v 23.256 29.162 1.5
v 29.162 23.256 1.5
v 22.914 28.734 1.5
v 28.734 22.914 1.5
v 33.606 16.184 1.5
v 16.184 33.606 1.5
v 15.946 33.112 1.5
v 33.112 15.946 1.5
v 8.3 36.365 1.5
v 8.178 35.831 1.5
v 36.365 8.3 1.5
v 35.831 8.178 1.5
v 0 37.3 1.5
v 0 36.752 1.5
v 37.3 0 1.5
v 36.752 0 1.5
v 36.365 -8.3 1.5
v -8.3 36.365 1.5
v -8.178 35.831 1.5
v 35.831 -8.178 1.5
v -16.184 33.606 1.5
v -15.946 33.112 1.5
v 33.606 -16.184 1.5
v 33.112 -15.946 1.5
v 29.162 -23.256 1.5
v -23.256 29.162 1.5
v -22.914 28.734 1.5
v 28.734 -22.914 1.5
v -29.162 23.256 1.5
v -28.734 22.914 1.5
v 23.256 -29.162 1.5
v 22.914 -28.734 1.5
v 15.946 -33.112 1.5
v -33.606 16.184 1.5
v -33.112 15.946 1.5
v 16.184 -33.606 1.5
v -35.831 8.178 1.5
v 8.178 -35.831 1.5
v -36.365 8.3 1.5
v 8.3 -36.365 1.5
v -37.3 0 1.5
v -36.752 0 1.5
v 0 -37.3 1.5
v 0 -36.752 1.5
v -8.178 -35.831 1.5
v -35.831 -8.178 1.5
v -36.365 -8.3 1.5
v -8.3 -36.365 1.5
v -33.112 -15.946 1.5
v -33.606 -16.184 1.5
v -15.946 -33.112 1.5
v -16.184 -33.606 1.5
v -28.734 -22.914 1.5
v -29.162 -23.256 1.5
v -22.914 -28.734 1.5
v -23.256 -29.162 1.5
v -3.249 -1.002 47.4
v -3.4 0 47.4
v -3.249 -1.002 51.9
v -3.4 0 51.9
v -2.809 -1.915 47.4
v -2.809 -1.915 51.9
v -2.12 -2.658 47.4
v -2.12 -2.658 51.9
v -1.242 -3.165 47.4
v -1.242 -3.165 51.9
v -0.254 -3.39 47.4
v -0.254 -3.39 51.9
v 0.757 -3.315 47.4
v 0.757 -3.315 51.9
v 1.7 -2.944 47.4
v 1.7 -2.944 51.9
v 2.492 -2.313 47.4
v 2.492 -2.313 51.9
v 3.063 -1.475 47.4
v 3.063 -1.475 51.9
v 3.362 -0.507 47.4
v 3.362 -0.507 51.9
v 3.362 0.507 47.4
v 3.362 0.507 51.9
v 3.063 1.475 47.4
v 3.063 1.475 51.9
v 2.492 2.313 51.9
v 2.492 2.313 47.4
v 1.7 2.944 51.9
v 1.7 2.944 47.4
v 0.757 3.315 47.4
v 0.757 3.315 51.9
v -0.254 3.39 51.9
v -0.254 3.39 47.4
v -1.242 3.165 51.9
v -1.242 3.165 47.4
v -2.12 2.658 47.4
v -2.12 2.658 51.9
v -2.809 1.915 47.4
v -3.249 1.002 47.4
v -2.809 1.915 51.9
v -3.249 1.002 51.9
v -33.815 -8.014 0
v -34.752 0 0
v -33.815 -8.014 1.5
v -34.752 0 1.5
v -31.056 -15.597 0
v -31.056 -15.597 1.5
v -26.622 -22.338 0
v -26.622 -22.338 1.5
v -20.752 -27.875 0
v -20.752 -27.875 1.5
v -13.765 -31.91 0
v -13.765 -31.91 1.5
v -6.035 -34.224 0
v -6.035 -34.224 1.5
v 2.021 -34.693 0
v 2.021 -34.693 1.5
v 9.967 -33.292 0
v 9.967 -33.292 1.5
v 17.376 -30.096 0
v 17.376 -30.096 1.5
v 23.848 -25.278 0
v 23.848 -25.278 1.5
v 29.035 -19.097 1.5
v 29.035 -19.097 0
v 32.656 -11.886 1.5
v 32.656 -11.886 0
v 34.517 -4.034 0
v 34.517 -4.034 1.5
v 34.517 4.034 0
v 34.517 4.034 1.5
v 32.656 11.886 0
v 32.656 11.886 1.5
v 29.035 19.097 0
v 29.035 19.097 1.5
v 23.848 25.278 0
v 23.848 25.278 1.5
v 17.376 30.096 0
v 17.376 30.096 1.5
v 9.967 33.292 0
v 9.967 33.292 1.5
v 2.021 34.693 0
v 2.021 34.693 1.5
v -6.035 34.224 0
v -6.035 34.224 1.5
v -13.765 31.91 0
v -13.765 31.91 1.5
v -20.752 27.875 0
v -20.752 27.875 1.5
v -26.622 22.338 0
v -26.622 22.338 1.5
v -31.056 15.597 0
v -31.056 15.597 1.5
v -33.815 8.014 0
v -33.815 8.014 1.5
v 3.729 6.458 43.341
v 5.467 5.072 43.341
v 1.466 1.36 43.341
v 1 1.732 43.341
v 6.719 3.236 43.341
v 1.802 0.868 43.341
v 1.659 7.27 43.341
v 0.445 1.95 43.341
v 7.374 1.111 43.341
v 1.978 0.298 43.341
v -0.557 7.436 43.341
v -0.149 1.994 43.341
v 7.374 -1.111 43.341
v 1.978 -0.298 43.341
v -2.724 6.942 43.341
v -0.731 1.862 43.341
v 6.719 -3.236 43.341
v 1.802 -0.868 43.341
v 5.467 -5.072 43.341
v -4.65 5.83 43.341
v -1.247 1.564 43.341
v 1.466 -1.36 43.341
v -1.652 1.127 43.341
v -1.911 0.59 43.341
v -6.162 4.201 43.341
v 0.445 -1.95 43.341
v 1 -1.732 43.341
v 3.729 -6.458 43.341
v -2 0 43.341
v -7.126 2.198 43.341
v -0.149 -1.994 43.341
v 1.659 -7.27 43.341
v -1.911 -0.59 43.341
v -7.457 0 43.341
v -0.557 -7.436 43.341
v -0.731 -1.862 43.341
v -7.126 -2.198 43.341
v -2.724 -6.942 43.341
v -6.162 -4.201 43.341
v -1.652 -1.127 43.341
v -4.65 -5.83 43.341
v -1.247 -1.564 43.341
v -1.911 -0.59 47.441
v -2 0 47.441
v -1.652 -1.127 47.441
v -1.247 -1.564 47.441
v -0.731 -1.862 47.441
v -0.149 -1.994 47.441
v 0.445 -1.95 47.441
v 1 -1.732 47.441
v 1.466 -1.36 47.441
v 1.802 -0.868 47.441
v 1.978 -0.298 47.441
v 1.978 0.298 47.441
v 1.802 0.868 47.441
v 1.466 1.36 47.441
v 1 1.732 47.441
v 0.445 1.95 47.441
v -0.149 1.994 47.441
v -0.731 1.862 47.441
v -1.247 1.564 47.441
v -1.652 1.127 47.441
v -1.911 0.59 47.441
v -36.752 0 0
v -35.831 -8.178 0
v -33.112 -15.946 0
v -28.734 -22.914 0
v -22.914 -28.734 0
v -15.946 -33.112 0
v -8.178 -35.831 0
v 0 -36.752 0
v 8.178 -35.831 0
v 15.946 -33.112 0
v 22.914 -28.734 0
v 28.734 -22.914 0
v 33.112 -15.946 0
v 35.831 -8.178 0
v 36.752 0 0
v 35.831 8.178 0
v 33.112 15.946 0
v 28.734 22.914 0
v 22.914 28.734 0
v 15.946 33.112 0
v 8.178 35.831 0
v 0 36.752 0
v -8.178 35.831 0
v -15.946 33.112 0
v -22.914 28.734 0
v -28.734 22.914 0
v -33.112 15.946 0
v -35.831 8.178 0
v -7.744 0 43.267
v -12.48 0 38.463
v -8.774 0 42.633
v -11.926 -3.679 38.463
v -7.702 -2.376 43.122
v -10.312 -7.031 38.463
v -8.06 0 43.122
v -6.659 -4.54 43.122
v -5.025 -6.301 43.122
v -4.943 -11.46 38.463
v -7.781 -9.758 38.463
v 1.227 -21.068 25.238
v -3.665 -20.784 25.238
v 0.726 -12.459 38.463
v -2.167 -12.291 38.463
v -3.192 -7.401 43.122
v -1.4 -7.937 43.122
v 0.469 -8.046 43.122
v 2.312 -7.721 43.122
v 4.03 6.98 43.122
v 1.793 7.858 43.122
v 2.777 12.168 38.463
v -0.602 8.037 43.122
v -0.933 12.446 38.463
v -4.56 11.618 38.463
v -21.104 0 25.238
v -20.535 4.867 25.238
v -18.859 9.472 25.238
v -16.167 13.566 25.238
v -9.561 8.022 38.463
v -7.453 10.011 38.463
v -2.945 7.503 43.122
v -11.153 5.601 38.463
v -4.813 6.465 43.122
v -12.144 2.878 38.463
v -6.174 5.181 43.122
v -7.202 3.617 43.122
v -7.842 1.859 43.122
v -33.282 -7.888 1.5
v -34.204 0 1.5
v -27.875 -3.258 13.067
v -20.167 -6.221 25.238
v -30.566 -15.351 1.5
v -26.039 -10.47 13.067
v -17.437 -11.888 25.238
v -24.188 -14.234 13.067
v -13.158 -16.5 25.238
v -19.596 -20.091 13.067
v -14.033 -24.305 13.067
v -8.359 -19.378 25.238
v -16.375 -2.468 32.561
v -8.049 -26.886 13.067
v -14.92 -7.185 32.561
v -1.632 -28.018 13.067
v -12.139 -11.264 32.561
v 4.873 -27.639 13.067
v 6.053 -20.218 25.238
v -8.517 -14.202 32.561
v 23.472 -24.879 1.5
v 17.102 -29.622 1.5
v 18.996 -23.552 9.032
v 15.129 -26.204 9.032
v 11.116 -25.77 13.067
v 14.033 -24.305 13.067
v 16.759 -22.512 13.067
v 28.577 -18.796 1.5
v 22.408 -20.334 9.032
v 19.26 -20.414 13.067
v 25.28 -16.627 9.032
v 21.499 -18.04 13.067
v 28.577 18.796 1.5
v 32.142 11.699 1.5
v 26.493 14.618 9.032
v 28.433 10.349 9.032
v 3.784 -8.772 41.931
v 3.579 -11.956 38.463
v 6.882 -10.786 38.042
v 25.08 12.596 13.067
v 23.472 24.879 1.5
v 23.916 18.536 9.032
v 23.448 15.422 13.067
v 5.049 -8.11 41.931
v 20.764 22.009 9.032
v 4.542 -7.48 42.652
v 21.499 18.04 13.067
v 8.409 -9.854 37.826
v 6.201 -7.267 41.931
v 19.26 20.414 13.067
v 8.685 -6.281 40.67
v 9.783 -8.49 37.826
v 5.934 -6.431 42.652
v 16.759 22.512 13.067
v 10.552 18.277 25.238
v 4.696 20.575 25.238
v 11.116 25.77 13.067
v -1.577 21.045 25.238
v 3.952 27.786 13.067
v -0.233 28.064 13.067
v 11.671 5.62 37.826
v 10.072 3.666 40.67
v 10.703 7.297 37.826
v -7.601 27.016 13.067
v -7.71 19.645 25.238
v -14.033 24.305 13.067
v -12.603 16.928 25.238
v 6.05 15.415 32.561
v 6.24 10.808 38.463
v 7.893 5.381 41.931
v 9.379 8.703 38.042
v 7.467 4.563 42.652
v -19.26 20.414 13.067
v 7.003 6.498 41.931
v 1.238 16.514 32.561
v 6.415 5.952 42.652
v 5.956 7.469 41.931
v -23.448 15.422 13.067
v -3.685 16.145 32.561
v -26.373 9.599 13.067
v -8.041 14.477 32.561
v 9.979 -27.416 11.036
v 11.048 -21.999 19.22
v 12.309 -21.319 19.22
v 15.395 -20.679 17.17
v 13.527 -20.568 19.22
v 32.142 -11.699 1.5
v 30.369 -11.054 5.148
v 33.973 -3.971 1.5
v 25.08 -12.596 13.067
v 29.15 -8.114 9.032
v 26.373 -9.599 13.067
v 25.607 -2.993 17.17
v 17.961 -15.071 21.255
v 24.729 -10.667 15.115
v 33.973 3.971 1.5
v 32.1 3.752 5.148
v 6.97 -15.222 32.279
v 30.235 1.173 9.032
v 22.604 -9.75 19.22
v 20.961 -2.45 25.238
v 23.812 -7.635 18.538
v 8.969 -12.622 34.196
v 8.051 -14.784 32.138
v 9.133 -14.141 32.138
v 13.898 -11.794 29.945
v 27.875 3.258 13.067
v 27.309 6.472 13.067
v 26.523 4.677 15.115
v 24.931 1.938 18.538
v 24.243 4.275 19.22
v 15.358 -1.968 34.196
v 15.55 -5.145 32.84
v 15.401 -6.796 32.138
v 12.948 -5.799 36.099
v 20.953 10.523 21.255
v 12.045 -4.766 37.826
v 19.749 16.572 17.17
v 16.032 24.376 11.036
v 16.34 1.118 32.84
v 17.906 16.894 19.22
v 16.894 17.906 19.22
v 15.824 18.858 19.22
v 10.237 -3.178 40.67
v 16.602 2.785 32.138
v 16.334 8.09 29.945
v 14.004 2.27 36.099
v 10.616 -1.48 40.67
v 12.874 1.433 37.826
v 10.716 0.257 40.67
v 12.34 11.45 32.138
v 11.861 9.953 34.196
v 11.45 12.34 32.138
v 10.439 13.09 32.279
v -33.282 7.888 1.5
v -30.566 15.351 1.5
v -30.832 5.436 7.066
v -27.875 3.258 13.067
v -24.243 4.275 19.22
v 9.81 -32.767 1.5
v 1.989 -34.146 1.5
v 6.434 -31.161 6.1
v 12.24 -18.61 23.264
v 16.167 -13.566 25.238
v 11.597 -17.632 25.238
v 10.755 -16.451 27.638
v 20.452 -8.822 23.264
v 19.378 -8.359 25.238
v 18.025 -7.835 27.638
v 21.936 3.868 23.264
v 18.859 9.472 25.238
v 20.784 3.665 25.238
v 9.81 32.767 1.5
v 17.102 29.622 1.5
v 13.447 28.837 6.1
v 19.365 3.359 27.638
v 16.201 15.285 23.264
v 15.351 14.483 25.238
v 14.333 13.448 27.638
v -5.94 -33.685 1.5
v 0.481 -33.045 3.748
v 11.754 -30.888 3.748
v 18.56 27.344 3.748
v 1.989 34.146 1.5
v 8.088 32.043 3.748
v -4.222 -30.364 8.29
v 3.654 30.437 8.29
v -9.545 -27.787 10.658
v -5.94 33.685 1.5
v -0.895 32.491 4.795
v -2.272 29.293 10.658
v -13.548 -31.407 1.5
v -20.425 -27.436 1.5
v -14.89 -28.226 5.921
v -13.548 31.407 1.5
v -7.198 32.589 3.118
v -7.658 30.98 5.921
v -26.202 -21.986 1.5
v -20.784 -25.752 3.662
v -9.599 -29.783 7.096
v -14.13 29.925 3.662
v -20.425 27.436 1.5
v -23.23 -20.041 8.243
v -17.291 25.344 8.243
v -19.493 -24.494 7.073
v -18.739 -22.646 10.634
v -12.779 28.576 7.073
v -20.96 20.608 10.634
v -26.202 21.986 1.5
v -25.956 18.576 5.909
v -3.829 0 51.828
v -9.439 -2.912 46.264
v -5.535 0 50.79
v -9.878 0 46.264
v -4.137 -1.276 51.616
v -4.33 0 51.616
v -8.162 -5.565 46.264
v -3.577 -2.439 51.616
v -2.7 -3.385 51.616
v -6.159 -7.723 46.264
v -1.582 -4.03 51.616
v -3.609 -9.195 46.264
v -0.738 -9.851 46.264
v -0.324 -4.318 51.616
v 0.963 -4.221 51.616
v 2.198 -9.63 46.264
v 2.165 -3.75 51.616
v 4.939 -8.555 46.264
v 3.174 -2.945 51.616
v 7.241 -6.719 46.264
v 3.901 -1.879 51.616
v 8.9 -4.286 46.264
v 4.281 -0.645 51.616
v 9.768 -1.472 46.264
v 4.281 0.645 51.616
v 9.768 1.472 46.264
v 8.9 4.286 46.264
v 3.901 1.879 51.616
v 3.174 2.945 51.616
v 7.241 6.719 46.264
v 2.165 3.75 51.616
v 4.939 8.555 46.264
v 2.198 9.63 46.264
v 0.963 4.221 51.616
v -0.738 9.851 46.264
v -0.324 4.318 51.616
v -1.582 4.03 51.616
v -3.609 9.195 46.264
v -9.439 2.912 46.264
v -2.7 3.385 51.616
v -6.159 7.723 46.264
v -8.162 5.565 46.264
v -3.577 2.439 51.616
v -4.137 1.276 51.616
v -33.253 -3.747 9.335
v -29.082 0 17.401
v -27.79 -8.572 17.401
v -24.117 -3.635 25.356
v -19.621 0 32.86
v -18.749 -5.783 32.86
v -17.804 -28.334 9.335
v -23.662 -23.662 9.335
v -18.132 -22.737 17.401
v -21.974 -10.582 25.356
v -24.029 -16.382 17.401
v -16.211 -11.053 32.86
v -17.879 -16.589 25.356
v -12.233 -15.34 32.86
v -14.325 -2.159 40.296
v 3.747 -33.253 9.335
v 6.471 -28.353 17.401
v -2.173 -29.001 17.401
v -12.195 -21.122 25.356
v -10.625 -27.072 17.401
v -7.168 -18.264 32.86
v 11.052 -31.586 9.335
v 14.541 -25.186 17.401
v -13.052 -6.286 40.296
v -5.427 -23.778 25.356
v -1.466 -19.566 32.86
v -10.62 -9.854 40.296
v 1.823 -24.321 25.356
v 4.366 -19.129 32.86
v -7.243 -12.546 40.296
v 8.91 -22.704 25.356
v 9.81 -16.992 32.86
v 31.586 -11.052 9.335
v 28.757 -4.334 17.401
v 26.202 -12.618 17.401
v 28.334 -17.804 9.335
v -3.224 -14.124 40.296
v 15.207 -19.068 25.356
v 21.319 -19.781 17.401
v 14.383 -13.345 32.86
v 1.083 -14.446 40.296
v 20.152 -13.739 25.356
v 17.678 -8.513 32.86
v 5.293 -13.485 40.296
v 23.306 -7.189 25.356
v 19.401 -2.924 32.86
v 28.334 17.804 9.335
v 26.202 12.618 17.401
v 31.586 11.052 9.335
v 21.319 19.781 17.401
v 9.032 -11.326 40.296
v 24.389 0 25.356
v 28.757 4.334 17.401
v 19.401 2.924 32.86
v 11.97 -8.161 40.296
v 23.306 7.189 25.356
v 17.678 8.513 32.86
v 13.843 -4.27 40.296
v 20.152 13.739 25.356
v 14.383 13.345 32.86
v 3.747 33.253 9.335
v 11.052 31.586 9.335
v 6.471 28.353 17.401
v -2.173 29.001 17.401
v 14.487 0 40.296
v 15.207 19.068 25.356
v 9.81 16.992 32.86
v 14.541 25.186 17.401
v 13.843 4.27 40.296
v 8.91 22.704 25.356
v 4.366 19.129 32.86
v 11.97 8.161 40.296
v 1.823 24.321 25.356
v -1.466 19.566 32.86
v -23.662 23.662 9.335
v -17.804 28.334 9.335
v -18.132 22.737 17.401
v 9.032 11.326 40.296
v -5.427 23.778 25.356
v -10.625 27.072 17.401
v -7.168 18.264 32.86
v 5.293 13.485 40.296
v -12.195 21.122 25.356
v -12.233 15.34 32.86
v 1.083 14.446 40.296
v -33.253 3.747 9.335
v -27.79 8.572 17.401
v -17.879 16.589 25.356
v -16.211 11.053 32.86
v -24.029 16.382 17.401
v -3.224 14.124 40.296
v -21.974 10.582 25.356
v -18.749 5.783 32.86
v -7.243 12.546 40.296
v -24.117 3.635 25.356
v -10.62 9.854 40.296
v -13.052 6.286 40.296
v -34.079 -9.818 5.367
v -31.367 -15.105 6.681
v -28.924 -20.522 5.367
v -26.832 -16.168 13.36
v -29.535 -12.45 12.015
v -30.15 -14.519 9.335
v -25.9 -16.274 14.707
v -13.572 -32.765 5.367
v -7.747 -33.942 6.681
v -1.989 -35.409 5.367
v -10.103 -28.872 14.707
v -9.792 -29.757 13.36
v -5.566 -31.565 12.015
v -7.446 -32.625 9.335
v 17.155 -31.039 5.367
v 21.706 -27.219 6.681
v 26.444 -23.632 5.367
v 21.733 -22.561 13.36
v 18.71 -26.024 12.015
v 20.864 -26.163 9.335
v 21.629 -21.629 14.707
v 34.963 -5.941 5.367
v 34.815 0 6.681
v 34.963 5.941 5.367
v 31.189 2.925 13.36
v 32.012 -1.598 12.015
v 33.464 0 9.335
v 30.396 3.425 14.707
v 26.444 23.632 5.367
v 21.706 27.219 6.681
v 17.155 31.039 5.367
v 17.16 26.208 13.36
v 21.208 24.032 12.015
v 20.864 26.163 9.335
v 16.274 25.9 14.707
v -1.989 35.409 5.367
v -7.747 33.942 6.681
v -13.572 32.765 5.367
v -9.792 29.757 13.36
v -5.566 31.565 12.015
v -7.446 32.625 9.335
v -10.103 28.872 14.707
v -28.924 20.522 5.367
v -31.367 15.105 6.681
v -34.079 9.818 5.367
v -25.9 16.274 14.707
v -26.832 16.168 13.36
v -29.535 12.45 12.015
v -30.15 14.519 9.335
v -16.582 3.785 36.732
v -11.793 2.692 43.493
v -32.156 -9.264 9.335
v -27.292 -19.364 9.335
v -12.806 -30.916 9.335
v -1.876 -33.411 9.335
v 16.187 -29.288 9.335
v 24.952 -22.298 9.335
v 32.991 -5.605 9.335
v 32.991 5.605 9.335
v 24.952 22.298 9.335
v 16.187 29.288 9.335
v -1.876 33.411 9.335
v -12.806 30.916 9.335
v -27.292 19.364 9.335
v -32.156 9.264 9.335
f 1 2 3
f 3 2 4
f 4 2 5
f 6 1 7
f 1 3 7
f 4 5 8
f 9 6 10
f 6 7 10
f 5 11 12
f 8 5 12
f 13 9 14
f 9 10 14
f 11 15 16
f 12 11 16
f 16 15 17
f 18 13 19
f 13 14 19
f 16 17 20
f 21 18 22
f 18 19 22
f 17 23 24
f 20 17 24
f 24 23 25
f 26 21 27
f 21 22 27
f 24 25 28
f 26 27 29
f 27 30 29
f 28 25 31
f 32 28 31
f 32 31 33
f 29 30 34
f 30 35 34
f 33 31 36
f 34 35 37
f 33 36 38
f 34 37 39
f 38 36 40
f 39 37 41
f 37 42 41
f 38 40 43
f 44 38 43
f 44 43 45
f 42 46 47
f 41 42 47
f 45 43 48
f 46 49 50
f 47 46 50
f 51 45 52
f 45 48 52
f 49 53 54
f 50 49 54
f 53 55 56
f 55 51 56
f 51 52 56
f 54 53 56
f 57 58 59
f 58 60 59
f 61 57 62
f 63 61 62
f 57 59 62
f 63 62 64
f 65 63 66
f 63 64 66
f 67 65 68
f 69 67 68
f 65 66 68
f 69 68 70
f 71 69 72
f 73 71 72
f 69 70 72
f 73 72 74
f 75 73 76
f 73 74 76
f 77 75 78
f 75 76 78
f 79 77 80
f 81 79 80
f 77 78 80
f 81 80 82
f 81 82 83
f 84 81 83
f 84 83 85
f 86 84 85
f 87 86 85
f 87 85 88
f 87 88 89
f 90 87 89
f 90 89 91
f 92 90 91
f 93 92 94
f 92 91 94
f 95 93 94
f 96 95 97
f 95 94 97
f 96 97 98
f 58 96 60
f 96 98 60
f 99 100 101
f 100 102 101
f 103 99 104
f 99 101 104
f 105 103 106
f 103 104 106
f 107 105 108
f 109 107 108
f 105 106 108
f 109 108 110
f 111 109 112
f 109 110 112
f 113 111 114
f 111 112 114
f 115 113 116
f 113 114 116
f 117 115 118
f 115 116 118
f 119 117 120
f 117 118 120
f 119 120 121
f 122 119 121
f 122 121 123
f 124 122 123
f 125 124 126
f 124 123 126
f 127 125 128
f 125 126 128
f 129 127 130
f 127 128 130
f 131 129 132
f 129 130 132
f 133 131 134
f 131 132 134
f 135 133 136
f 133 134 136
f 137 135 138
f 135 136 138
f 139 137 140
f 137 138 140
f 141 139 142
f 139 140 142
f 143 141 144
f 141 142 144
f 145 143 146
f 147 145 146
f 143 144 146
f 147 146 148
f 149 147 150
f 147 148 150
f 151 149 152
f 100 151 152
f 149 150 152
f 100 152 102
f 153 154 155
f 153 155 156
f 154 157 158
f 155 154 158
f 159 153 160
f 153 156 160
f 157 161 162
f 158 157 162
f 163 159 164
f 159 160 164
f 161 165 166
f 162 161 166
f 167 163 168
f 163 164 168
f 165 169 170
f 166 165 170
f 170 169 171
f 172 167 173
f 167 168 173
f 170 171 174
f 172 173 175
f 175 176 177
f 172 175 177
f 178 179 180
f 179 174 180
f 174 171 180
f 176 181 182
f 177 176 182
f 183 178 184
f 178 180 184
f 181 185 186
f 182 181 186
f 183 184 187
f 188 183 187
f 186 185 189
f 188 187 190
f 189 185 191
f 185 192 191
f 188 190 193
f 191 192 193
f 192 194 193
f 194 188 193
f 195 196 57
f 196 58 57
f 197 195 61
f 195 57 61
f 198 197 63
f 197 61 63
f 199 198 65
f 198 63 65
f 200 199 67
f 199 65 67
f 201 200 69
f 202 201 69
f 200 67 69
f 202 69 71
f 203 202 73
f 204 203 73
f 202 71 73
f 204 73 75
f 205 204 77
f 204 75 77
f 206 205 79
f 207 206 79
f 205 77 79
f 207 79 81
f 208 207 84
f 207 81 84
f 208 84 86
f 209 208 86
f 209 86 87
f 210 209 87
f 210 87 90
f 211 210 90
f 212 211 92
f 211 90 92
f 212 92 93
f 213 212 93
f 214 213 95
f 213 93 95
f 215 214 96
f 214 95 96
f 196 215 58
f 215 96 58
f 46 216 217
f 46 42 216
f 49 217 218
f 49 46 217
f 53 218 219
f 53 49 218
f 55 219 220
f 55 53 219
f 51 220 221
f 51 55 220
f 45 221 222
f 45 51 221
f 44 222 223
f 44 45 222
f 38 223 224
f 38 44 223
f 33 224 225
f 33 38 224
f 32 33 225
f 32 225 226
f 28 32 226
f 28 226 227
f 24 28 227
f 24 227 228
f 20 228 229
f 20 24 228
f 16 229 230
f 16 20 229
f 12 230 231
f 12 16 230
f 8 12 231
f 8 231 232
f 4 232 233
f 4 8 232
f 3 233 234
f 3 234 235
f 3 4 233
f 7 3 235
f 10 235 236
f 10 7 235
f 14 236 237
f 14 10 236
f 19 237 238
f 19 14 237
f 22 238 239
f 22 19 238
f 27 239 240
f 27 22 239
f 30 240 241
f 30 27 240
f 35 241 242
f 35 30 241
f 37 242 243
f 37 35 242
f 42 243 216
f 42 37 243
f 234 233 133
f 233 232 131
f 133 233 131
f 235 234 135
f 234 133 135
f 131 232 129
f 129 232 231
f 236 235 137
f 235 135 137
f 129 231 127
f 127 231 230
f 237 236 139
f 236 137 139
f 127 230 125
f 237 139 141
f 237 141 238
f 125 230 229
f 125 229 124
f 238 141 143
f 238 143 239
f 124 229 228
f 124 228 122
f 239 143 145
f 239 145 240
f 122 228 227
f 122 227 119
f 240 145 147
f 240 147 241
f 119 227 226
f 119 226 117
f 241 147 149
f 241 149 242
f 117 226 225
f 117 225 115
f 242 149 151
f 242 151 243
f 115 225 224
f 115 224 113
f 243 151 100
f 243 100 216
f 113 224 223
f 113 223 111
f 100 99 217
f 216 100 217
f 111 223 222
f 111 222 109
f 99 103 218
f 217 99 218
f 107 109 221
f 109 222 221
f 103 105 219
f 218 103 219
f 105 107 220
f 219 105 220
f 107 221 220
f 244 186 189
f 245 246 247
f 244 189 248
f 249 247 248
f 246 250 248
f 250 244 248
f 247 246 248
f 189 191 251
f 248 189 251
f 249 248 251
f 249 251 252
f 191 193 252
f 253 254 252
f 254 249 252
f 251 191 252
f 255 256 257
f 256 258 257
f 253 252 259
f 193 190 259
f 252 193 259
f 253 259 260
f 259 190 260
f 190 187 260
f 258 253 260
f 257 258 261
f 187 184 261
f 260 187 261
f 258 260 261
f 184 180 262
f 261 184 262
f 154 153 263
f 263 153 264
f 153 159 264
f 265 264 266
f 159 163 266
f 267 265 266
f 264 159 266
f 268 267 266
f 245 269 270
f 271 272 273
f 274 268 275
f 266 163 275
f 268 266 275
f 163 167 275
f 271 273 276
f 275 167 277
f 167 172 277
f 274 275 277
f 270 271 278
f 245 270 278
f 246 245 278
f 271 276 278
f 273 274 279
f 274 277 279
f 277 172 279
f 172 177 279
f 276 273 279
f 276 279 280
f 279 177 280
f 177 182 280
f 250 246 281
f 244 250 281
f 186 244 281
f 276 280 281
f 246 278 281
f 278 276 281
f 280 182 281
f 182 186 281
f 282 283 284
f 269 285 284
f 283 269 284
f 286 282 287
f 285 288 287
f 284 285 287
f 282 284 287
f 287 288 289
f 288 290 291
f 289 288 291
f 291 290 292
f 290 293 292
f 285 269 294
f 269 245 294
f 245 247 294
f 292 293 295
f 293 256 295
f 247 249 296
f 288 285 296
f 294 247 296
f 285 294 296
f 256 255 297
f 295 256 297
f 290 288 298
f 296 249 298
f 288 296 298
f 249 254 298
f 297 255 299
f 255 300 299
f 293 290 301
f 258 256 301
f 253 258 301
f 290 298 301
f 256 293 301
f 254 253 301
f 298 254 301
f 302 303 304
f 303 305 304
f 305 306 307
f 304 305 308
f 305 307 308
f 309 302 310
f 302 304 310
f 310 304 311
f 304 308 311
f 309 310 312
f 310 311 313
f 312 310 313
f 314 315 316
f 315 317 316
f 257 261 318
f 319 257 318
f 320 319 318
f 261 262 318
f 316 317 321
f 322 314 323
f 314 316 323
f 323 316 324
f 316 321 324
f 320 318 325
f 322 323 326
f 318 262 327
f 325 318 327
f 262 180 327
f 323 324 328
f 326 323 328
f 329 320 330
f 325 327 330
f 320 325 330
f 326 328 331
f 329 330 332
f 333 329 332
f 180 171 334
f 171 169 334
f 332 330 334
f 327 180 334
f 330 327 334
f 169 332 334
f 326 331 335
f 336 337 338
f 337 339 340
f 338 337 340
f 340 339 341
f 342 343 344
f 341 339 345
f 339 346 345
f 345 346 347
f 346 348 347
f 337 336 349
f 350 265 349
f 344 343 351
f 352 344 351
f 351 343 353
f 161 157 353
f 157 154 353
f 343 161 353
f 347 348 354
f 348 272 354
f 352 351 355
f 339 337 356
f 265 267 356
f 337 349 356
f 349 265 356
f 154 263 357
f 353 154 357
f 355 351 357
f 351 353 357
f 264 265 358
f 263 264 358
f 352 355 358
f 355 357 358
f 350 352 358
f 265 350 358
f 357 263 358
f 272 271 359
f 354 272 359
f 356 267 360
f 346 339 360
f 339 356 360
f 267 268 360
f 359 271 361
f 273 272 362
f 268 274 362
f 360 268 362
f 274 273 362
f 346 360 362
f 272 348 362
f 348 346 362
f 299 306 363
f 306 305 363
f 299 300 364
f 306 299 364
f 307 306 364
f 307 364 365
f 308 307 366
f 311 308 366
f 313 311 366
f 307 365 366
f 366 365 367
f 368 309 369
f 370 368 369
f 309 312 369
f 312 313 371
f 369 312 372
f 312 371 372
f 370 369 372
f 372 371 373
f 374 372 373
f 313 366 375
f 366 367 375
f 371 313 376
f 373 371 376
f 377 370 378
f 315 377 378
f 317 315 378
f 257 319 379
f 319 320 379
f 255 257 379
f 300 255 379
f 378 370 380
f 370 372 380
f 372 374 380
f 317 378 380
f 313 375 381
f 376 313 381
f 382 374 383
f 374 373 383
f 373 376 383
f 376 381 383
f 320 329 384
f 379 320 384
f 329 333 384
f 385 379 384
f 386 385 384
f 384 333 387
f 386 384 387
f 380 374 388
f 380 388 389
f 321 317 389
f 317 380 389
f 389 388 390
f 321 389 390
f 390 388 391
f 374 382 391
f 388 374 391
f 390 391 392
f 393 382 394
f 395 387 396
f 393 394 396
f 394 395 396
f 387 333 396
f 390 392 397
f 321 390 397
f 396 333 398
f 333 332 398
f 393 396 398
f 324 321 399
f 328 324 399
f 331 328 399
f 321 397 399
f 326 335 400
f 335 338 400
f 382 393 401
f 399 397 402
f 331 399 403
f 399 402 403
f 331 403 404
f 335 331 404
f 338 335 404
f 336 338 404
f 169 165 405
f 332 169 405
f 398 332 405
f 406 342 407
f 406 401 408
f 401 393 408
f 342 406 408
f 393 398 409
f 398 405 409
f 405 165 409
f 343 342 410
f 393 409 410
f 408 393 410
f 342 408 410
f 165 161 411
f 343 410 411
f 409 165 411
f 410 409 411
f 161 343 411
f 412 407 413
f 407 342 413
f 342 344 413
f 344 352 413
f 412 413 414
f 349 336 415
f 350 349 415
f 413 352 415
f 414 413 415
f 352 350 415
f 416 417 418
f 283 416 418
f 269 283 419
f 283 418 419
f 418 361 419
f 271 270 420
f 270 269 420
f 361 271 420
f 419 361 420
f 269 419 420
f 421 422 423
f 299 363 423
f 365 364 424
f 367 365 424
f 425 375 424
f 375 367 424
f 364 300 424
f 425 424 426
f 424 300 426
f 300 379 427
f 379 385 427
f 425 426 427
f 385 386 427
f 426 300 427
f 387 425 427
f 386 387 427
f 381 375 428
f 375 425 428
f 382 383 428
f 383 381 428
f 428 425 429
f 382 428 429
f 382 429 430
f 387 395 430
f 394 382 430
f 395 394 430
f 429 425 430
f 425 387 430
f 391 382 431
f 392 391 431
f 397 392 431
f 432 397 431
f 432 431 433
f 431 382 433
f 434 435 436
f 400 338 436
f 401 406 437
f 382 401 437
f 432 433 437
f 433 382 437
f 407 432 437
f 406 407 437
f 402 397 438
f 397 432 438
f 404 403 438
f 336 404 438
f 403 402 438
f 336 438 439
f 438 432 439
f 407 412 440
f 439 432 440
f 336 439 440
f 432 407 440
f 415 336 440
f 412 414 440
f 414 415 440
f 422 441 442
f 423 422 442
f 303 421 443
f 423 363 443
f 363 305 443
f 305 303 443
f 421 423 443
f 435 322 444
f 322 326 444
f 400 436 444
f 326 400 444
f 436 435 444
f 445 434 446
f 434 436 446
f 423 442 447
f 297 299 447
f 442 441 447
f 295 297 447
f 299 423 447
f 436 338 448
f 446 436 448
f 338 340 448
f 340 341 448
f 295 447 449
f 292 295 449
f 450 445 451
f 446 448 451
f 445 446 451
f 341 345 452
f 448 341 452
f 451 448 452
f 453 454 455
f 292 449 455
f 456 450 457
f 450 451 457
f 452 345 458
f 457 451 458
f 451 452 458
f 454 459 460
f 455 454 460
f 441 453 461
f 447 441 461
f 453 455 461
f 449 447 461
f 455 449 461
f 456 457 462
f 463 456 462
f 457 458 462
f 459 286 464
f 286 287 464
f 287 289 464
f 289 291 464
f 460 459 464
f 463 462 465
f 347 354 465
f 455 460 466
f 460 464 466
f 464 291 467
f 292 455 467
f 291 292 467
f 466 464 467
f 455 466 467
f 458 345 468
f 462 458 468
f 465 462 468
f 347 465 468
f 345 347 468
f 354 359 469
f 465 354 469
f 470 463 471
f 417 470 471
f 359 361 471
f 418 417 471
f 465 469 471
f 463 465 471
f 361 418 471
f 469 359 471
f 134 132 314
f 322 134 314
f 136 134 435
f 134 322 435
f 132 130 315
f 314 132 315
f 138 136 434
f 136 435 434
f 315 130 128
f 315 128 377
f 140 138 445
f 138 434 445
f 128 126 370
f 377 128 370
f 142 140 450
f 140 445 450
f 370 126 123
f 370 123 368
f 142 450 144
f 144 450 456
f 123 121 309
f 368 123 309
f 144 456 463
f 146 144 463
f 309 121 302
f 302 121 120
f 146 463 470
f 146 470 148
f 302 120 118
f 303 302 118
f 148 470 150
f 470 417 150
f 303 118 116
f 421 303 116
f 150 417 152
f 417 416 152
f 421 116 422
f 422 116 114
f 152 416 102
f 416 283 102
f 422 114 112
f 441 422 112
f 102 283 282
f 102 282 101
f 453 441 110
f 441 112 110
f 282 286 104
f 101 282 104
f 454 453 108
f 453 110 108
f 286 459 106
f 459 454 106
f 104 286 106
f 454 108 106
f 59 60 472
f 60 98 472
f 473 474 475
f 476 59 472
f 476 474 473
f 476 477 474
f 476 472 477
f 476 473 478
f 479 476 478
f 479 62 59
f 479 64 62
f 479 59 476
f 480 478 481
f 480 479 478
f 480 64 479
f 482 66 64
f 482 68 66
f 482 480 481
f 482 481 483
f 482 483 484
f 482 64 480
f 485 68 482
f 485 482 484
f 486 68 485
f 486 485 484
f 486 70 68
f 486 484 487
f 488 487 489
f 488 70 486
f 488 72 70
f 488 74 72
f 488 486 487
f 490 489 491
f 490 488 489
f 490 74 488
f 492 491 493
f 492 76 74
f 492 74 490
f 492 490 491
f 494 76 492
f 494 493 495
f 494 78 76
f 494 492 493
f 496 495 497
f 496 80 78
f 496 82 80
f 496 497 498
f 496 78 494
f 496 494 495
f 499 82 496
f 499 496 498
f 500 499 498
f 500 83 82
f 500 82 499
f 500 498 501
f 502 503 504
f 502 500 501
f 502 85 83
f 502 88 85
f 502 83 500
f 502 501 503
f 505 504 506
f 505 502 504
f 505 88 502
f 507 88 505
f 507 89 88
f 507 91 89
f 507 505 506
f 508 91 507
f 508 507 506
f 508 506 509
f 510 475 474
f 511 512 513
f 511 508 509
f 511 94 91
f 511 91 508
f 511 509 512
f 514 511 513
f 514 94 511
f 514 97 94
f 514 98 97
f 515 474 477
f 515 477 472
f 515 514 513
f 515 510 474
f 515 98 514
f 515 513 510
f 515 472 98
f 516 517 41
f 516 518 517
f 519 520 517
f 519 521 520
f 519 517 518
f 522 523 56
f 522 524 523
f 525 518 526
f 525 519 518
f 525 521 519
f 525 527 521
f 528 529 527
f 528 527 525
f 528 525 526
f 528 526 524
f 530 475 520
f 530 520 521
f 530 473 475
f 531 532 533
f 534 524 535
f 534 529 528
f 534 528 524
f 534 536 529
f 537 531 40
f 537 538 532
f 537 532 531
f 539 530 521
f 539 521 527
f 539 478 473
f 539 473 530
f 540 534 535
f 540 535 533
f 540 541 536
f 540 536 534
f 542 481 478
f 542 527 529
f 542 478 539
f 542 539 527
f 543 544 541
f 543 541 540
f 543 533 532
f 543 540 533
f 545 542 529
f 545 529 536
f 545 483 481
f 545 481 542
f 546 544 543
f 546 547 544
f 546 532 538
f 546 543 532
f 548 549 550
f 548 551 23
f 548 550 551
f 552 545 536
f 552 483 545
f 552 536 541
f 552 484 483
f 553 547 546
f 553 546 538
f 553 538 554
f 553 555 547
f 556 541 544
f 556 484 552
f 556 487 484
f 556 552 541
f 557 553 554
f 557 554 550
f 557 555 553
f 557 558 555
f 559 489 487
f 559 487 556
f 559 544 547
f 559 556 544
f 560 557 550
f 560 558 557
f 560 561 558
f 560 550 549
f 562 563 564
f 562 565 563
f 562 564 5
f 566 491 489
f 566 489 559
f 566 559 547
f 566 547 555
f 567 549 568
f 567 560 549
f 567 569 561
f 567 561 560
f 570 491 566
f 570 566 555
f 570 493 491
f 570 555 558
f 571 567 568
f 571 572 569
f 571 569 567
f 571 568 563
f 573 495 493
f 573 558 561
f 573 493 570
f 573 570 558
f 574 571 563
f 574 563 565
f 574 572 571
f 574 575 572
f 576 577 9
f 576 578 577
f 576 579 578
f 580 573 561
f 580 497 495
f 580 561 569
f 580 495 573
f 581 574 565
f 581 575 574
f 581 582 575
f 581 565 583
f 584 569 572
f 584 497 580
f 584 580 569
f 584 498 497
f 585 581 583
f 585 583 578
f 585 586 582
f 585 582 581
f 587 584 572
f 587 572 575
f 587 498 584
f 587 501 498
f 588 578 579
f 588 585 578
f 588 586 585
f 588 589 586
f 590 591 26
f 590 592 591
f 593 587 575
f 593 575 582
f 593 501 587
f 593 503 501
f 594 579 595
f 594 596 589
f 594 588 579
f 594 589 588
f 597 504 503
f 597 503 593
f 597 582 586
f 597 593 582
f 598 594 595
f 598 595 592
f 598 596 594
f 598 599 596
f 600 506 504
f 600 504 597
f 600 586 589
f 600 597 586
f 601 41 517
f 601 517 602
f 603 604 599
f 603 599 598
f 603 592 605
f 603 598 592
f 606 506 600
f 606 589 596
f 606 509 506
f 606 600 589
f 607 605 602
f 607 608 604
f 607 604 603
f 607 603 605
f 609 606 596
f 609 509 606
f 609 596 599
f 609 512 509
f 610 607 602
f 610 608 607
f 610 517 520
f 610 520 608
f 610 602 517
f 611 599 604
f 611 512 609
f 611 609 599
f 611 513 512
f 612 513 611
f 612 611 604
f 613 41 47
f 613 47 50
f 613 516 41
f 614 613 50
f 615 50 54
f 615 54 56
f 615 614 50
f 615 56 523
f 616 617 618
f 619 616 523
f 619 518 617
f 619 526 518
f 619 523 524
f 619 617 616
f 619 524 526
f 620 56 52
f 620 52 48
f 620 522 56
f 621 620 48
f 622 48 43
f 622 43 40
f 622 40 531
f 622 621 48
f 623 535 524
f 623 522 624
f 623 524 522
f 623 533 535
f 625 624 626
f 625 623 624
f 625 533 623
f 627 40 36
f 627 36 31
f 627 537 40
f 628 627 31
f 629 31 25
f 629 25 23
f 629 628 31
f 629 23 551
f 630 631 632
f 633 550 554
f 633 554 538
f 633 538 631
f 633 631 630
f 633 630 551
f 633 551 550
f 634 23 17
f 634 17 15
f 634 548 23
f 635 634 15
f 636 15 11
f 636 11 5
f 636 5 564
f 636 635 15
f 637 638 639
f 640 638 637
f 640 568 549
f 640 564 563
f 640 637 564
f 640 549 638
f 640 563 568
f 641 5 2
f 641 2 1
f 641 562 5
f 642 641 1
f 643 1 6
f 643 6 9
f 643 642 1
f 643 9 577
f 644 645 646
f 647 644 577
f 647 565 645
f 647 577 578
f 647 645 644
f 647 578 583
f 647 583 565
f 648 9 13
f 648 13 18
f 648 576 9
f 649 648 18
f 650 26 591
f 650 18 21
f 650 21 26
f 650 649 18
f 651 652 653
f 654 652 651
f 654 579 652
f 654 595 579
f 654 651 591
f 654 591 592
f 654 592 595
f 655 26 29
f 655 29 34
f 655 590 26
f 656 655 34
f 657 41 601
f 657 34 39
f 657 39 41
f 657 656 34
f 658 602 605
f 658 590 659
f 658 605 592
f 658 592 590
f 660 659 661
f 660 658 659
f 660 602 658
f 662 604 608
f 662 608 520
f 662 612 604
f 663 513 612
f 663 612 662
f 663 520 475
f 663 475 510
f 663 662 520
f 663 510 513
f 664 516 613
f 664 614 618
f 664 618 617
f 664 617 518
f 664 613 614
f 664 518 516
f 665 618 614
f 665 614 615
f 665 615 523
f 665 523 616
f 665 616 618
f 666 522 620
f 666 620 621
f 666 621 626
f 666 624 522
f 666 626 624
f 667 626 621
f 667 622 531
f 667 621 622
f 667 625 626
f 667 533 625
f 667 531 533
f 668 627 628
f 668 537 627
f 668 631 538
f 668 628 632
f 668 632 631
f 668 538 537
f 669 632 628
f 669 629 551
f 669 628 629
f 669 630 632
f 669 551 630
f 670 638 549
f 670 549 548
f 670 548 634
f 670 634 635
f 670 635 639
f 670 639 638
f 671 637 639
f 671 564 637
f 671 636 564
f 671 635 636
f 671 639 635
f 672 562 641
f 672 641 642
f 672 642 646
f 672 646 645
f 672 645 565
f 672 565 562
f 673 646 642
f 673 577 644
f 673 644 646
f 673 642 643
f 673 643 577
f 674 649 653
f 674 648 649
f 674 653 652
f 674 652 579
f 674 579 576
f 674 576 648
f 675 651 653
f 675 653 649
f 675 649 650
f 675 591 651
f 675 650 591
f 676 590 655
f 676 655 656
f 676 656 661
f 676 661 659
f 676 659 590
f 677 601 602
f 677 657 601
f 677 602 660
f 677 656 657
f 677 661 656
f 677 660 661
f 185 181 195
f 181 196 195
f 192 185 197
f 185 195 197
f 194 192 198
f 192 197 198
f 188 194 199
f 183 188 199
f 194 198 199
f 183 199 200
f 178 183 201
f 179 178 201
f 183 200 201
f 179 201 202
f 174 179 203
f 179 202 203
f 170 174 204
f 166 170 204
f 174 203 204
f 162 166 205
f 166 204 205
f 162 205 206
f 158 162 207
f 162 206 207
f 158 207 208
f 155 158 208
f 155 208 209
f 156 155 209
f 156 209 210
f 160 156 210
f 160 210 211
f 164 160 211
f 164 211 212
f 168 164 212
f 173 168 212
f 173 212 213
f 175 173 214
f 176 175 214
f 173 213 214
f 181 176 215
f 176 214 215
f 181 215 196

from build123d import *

# Parameters (mm, degrees)
F0_W = 2
F0_H = 1.5


with BuildPart() as f2:
    # F0 (on Front) → F2 (revolve)
    with BuildSketch(Plane.XZ):
        with BuildLine():
            Line((-3.4, 47.4), (-3.4, 51.9))
            add(Edge.make_bspline(
                [(-37.3, 1.5), (-27.3523367941, 23.2050957464), (-7.8810648993, 51.9), (-3.4, 51.9)],
                knots=[0, 0, 0, 0, 60.7401843922, 60.7401843922, 60.7401843922, 60.7401843922], degree=3))
            Line((-37.3, 1.5), (-36.752, 1.5))
            Line((-36.752, 1.5), (-34.752, 1.5))
            Line((-34.752, 1.5), (-34.2042931025, 1.5))
            add(Edge.make_bspline(
                [(-34.2042931025, 1.5), (-26.1722553611, 17.2586675336), (-11.5852886811, 42.7479877156), (-7.4573417298, 43.3413521588)],
                knots=[0, 0, 0, 0, 49.6598243876, 49.6598243876, 49.6598243876, 49.6598243876], degree=3))
            Line((-7.4573417298, 43.3413521588), (-2, 43.3413521588))
            Line((-2, 43.3413521588), (-2, 47.4413521588))
            Line((-2, 47.4413521588), (-3.4, 47.4))
        make_face()
        with Locations((-35.752, 0.75)):
            Rectangle(F0_W, F0_H)
    revolve(axis=Axis((0, 0, 0), (0, 0, 1)))


solid = f2.part
